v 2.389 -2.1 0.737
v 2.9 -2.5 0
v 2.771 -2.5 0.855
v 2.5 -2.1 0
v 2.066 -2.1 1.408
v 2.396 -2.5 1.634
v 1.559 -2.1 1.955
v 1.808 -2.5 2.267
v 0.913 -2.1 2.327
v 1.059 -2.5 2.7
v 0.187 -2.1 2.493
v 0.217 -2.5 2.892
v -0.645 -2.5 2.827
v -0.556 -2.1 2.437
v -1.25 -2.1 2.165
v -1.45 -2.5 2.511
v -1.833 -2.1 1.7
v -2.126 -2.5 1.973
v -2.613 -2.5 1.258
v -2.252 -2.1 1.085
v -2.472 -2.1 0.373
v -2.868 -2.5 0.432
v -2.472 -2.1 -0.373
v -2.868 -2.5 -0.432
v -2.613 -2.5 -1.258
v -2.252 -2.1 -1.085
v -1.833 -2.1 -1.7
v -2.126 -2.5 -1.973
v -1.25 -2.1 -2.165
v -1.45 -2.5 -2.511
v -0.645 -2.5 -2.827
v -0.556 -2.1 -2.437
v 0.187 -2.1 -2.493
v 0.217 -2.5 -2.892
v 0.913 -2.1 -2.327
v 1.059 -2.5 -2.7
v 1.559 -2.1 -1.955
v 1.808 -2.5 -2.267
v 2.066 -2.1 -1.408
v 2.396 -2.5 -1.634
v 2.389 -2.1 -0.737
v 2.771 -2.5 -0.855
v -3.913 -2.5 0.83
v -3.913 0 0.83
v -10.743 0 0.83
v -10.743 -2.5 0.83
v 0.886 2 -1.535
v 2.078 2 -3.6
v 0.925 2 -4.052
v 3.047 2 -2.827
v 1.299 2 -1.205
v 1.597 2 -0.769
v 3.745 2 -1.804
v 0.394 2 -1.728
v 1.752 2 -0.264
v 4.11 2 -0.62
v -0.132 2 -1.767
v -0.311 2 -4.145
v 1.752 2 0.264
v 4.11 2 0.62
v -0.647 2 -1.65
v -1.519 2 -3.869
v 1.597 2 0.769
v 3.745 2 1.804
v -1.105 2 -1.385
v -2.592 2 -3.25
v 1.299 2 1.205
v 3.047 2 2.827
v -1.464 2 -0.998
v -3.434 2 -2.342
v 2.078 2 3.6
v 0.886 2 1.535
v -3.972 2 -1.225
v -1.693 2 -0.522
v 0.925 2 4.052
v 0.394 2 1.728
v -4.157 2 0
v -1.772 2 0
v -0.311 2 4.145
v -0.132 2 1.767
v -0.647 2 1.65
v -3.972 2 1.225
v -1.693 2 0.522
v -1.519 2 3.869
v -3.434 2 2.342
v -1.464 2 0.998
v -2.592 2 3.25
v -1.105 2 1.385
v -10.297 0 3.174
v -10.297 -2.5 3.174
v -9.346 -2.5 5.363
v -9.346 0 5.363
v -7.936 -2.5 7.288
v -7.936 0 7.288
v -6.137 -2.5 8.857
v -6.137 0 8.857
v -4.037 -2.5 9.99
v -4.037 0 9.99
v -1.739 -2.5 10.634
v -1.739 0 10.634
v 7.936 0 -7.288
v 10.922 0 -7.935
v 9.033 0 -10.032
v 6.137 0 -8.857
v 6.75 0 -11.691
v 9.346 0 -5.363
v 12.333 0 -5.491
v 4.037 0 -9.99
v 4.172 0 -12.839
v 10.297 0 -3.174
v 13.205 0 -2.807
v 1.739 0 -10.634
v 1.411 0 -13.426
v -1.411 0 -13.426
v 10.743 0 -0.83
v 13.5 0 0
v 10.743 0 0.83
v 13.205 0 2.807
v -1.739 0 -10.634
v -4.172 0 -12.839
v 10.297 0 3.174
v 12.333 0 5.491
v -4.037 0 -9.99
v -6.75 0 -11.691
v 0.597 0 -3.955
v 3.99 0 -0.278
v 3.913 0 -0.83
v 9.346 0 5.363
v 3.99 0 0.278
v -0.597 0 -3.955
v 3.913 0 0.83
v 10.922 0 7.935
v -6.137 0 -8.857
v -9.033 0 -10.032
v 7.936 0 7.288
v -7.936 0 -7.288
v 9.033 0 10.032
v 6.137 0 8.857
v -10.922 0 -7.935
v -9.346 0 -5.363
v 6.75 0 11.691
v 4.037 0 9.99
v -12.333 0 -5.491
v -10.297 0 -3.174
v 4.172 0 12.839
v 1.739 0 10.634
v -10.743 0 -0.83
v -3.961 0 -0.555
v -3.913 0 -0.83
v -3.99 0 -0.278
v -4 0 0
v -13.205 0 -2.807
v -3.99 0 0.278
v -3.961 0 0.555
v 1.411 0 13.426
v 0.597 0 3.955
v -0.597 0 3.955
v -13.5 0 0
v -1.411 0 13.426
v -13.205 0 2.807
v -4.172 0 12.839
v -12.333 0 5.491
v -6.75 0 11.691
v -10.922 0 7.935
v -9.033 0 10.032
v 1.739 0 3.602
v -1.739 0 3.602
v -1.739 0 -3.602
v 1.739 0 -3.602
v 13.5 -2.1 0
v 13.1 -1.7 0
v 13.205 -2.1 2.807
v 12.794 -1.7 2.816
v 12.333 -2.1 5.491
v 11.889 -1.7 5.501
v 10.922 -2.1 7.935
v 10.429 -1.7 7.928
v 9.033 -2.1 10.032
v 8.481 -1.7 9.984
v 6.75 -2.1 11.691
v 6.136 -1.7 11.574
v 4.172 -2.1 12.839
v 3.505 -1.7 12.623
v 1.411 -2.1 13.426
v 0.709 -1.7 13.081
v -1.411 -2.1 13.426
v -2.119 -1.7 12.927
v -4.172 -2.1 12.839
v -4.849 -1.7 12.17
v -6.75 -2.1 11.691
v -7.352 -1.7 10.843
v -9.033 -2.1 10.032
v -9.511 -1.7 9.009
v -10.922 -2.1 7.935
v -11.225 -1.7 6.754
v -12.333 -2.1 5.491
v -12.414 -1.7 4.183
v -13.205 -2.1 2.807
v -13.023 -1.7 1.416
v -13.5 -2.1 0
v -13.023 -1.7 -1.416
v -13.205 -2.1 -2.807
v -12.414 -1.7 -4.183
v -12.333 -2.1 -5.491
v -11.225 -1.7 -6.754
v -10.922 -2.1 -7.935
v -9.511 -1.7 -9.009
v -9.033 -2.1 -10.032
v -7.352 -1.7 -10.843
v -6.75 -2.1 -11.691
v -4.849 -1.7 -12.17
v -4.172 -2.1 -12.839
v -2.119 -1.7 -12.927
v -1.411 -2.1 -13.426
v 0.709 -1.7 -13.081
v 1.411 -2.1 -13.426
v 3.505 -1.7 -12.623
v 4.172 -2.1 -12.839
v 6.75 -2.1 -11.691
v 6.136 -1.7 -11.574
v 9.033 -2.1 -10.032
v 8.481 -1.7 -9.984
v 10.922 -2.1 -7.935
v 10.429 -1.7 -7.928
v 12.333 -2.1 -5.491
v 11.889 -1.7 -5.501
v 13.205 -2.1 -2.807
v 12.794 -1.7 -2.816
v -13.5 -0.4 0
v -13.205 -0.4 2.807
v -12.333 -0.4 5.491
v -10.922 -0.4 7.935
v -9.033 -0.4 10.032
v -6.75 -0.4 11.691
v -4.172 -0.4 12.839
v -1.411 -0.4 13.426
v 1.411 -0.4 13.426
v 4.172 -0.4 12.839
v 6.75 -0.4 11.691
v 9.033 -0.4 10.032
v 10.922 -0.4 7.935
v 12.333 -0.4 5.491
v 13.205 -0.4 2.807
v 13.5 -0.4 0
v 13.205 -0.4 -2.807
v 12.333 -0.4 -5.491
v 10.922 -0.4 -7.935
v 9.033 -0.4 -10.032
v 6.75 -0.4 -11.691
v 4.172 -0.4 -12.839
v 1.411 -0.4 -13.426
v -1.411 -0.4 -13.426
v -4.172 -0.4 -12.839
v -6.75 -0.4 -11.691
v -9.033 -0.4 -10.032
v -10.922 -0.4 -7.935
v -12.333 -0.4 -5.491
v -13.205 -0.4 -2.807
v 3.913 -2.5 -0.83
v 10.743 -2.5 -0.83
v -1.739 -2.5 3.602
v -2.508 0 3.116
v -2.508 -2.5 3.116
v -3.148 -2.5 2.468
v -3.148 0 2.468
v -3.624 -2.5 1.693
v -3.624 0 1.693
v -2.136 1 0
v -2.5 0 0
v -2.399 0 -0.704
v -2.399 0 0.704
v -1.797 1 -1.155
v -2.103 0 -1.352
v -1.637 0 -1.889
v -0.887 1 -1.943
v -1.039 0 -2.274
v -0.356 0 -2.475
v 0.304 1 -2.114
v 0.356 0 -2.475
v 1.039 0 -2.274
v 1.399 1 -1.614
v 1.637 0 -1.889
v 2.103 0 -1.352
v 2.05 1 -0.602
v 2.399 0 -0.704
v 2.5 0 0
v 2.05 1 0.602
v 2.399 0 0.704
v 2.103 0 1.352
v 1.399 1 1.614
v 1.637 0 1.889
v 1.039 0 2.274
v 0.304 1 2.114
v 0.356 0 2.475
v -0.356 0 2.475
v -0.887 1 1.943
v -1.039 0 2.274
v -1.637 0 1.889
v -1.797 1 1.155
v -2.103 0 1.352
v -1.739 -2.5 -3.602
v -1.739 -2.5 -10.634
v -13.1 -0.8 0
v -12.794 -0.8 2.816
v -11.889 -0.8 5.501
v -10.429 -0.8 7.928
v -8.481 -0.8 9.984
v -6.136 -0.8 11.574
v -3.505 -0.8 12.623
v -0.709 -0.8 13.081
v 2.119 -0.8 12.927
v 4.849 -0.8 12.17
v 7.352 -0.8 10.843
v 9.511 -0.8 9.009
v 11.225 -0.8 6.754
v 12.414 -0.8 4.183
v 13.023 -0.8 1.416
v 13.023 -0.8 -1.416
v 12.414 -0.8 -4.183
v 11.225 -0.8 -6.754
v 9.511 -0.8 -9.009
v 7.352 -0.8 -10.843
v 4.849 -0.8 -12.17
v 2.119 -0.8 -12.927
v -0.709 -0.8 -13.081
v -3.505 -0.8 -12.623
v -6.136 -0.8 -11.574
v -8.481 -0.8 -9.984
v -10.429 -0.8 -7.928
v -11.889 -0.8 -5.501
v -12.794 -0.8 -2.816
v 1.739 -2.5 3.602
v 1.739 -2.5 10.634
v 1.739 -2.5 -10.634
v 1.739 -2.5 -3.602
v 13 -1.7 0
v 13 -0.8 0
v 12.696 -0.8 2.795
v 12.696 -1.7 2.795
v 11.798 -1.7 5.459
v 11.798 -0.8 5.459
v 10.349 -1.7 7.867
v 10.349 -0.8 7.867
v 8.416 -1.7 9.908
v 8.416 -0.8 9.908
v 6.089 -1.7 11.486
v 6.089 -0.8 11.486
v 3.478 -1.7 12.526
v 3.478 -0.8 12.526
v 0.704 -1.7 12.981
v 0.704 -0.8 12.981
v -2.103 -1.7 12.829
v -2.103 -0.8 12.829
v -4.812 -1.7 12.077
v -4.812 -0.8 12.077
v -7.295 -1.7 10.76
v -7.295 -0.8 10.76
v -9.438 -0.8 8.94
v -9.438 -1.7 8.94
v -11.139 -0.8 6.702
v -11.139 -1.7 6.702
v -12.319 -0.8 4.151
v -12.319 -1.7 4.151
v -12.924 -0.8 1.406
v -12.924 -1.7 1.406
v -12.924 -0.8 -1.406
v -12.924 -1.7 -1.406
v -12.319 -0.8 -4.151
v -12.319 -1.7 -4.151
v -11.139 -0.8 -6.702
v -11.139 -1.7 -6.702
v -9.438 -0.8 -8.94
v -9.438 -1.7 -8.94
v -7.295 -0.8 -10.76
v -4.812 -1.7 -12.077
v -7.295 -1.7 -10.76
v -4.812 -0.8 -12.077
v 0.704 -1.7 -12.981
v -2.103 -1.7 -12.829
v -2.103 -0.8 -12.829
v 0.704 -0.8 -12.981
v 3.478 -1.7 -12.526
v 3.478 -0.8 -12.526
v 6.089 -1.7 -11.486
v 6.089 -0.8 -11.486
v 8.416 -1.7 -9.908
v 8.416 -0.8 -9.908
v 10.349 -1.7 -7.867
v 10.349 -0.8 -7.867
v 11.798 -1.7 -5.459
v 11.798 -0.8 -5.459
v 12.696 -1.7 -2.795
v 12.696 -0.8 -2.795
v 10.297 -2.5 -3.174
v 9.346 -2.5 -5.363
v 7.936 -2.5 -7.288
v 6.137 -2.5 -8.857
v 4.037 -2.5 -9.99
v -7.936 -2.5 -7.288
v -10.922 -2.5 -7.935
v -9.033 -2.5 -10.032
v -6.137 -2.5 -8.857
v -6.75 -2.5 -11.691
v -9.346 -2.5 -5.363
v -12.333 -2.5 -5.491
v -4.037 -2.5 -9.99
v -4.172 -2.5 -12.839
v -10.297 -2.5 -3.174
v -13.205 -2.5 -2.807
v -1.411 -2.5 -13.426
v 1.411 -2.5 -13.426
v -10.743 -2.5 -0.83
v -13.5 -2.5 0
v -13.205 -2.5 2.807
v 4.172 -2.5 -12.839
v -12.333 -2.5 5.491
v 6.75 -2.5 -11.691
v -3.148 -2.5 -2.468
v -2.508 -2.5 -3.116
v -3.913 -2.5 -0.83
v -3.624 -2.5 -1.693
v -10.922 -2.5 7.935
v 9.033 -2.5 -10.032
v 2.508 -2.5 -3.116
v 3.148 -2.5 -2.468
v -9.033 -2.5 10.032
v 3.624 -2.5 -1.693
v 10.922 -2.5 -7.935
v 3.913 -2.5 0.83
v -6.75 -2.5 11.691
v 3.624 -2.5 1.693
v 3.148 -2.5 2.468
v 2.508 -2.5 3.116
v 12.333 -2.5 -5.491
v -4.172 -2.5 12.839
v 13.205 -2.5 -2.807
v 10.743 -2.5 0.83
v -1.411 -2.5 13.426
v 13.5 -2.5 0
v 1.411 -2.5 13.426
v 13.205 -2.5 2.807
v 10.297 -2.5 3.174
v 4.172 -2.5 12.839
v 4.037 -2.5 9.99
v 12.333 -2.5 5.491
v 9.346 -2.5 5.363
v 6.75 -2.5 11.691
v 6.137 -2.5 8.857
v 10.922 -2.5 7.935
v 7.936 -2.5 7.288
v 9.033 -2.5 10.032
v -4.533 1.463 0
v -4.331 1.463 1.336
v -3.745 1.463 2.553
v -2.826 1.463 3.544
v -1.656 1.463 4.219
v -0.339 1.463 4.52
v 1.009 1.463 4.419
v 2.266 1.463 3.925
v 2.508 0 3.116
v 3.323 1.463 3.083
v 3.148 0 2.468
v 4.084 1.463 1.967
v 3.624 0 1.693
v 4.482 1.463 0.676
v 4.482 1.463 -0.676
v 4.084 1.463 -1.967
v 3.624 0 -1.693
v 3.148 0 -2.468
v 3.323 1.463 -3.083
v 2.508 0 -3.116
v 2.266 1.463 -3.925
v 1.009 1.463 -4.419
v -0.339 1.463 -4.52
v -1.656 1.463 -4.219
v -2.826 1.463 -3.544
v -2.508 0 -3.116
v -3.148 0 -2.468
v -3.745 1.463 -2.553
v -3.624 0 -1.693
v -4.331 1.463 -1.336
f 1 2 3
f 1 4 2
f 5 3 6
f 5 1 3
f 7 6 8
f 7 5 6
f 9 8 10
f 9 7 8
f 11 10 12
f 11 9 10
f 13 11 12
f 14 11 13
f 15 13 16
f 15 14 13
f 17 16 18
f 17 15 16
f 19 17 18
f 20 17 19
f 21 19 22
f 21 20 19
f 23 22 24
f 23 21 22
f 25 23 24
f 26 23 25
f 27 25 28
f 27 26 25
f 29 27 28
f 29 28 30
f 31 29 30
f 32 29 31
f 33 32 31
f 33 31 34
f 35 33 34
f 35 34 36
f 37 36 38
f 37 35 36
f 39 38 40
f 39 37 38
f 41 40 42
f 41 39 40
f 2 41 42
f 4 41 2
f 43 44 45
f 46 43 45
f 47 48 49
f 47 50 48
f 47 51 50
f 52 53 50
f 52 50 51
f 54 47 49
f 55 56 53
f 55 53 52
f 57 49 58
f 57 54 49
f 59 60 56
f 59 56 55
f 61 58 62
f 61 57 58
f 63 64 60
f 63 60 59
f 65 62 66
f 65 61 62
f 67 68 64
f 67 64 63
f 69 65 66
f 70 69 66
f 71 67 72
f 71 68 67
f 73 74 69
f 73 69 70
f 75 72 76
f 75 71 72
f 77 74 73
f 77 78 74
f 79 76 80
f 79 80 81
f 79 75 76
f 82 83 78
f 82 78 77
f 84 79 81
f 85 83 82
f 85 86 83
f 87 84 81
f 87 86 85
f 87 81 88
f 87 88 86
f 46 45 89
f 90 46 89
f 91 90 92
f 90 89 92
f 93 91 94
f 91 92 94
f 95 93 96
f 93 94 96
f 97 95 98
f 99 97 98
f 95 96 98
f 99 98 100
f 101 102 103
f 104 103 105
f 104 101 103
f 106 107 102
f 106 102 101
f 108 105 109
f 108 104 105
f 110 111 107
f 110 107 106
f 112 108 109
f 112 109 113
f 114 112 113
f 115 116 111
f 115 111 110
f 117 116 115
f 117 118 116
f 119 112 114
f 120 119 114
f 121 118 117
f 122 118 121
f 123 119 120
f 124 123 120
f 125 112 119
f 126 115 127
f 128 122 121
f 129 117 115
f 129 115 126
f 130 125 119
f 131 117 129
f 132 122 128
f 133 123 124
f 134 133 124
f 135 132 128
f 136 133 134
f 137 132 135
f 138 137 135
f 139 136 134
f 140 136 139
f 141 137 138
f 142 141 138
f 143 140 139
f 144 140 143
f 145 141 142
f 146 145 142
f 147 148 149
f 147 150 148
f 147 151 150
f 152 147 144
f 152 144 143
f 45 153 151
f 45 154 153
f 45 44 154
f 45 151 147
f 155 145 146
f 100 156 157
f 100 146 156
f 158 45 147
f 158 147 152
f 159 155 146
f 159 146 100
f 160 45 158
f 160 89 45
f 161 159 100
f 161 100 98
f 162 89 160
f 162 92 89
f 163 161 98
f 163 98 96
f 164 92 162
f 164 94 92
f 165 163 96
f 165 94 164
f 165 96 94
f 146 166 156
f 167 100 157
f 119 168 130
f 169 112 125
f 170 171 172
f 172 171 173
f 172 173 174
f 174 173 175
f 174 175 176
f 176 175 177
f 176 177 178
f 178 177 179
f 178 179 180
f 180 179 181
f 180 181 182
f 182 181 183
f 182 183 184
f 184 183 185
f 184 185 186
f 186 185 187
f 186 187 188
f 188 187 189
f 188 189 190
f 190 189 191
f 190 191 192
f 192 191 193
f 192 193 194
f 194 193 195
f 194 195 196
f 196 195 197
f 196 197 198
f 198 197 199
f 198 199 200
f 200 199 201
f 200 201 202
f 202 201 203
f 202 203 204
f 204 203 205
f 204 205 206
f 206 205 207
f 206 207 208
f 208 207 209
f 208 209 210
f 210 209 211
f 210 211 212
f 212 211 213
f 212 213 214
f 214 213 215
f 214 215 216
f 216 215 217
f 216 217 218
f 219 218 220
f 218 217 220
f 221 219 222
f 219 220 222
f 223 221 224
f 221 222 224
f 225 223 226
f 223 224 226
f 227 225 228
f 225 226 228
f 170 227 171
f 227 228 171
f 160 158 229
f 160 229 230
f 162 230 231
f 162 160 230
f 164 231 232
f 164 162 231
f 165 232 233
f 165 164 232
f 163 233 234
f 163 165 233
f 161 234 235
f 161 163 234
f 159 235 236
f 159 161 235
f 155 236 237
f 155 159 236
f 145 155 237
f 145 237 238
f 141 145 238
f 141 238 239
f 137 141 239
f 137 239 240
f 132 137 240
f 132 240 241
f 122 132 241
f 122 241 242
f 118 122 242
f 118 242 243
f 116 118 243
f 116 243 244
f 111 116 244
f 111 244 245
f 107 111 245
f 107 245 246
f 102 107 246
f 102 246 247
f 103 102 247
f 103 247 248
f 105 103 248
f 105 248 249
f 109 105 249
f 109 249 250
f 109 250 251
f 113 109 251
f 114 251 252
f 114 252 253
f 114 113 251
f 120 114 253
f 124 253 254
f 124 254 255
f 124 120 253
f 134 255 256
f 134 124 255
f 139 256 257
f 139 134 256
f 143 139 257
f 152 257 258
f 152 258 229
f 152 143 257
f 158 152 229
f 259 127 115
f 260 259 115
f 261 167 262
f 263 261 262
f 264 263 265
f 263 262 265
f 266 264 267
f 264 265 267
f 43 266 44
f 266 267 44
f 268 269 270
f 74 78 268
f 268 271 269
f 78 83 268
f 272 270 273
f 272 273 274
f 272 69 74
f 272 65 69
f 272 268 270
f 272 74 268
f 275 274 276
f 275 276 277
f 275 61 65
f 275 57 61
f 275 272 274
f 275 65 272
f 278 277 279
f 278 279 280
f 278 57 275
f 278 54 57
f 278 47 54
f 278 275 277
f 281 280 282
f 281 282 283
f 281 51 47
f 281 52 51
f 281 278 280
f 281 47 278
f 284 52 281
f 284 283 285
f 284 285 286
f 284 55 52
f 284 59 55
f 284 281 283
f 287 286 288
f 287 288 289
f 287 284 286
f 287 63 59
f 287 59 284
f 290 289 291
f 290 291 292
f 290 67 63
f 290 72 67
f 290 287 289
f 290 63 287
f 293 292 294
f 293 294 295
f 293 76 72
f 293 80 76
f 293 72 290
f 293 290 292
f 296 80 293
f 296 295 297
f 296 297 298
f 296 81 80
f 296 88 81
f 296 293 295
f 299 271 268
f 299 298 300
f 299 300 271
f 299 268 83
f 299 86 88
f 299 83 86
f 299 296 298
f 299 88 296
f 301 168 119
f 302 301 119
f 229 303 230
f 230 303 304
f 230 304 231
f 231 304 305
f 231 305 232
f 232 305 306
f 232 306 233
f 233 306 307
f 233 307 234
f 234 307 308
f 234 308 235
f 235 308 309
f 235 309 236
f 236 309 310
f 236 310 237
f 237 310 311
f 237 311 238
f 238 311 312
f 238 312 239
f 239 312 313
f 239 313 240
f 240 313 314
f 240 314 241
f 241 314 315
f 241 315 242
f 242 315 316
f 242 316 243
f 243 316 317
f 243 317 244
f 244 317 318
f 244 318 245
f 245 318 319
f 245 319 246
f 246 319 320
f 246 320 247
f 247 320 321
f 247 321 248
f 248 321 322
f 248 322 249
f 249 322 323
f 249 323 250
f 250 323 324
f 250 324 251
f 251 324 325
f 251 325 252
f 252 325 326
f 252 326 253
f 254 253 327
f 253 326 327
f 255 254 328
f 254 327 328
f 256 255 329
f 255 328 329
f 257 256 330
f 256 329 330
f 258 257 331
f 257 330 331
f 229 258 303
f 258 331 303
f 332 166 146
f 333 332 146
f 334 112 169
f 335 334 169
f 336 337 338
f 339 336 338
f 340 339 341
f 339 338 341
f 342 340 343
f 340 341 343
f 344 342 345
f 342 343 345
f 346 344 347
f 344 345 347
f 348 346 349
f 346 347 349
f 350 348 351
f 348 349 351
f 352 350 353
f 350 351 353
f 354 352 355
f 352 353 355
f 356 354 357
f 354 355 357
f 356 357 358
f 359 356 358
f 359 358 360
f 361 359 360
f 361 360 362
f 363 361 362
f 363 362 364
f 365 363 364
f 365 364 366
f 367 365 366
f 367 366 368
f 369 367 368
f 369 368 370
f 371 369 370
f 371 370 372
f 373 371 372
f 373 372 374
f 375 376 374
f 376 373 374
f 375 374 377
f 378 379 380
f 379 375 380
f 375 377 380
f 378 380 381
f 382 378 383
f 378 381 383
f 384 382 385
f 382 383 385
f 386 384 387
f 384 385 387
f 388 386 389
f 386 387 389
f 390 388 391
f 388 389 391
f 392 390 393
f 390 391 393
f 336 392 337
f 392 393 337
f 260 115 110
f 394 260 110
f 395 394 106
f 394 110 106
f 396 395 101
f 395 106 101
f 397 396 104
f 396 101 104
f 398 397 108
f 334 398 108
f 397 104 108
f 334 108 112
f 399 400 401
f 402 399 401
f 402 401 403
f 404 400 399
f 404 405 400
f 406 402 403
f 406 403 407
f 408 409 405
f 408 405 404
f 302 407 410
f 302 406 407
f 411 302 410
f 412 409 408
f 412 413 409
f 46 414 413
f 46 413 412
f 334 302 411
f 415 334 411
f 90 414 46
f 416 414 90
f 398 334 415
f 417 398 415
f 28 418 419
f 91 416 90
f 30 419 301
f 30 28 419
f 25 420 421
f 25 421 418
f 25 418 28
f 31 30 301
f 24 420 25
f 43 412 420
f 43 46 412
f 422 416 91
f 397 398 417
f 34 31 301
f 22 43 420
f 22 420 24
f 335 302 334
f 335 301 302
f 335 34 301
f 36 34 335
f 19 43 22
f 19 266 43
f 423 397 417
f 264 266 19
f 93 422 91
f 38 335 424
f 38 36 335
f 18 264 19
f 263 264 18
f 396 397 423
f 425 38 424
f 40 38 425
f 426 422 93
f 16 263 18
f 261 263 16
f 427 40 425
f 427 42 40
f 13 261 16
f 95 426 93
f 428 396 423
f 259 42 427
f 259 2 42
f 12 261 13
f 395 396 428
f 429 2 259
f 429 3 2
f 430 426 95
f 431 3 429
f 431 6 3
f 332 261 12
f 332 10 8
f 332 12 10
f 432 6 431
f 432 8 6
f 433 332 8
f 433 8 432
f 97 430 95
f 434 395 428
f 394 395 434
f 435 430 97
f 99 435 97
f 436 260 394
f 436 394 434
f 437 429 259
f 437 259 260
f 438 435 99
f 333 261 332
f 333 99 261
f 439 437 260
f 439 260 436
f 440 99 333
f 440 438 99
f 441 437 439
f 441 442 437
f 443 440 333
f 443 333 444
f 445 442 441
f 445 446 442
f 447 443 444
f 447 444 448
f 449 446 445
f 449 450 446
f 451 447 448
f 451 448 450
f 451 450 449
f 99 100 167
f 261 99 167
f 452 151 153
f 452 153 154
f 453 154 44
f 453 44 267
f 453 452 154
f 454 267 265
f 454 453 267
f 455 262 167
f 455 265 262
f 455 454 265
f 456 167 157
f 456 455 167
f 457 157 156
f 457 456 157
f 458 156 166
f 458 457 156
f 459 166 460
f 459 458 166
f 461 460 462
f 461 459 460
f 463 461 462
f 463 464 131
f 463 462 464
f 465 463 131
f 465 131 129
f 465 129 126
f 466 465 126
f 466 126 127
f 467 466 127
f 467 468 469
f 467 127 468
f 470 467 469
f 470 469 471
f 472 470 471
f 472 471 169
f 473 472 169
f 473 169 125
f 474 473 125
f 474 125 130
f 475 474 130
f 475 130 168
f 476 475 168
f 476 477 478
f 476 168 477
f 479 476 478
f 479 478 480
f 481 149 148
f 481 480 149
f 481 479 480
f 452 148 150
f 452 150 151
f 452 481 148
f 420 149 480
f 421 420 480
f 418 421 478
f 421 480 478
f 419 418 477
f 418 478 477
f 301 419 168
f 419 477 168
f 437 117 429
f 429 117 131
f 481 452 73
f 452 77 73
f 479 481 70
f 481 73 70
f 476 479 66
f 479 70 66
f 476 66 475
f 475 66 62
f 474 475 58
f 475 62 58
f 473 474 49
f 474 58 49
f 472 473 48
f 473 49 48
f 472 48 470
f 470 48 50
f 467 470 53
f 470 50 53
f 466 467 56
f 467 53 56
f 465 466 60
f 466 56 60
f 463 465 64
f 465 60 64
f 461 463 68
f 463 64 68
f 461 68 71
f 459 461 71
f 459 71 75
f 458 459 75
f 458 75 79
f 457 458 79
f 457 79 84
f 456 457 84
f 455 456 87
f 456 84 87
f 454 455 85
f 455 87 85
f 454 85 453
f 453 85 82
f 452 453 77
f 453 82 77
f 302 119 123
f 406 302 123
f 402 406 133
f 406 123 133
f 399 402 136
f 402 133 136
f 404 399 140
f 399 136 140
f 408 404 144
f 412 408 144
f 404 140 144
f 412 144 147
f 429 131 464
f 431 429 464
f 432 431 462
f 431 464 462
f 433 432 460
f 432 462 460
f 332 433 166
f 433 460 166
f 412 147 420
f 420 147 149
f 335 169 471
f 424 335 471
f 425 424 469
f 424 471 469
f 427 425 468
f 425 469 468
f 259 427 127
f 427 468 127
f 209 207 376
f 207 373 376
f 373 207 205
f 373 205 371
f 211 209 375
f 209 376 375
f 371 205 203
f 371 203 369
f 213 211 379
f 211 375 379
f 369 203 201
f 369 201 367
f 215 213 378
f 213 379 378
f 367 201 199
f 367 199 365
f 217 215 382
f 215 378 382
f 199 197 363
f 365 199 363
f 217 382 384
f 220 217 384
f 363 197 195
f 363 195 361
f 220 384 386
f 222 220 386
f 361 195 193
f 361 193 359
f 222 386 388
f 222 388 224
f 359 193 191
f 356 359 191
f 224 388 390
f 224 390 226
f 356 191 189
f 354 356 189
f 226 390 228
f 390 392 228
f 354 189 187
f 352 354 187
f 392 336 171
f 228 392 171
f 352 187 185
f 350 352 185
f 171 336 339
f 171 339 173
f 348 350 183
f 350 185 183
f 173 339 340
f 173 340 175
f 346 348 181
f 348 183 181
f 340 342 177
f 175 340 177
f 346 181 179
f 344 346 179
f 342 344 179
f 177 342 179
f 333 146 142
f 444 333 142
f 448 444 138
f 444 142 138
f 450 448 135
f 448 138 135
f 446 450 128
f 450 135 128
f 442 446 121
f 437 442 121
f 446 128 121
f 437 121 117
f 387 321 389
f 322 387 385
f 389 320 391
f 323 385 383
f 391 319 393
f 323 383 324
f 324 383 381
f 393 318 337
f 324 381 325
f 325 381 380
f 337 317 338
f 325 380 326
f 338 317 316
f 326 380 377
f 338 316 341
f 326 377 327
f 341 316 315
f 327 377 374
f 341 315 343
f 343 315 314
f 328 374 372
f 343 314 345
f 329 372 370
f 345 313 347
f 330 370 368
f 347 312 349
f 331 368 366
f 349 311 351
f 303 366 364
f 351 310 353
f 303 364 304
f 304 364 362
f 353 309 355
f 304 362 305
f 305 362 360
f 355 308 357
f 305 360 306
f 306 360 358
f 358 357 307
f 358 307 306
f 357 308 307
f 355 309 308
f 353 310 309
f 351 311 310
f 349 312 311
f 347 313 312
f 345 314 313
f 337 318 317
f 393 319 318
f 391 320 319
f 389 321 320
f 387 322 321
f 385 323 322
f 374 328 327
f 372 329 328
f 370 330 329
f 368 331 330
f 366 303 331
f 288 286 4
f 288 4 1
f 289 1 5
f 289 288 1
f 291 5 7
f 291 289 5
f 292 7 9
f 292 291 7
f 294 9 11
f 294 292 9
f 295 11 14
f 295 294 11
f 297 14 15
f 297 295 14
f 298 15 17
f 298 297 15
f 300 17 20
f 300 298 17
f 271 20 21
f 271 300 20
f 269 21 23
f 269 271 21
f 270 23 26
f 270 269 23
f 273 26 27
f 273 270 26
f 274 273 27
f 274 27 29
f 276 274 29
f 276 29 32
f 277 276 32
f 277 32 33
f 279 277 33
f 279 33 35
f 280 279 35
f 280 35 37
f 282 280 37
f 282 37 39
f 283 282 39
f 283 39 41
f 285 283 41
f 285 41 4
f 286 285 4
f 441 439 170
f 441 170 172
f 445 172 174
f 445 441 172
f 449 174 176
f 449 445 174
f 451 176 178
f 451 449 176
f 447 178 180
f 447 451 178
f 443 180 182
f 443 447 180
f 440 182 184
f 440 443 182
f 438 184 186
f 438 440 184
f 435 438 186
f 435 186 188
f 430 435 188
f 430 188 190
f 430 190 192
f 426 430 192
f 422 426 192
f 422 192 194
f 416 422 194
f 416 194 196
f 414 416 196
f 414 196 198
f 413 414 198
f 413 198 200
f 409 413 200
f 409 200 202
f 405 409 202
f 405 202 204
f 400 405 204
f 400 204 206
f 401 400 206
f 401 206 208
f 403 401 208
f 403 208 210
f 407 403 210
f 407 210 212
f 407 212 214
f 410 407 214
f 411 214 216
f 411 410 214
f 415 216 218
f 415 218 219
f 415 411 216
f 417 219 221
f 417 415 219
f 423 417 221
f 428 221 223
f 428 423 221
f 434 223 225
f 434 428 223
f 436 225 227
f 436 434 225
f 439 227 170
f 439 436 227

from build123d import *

# Parameters (mm, degrees)
F0_R     = 13
F0_R_2   = 2.5
F1_DEPTH = 2.5
F2_R     = 13.5
F2_R_2   = 10.9075922355
F3_DEPTH = 0.8
F4_R     = 13.5
F4_R_2   = 11.2490689916
F5_DEPTH = 0.8
F6_R     = 4
F6_R_2   = 2.5
F7_DEPTH = 2
F7_TAPER = -20


# Not quite as in the source:
# - a fillet or chamfer that OpenCascade refuses, or shapes differently, is made with other operations: its cross-section is extruded or revolved along the edge and cut away or added


with BuildPart() as f1:
    # F0 (on Front) → F1 (new body)
    with BuildSketch(Plane.XZ):
        Circle(F0_R)
        with BuildLine():
            ThreePointArc((-1.7385059182, -10.6337636412), (-7.9358324082, -7.2884769323), (-10.7429600727, -0.8295425725))
            Line((-10.7429600727, -0.8295425725), (-3.9130370712, -0.8295425725))
            ThreePointArc((-3.9130370712, -0.8295425725), (-3.1475751054, -2.468353896), (-1.7385059182, -3.6024432227))
            Line((-1.7385059182, -3.6024432227), (-1.7385059182, -10.6337636412))
        make_face(mode=Mode.SUBTRACT)
        with BuildLine():
            Line((3.9130370712, -0.8295425725), (10.7429600727, -0.8295425725))
            ThreePointArc((10.7429600727, -0.8295425725), (7.9358324082, -7.2884769323), (1.7385059182, -10.6337636412))
            Line((1.7385059182, -10.6337636412), (1.7385059182, -3.6024432227))
            ThreePointArc((1.7385059182, -3.6024432227), (3.1475751054, -2.468353896), (3.9130370712, -0.8295425725))
        make_face(mode=Mode.SUBTRACT)
        with BuildLine():
            ThreePointArc((-1.7385059182, 3.6024432227), (-3.1475751054, 2.468353896), (-3.9130370712, 0.8295425725))
            Line((-3.9130370712, 0.8295425725), (-10.7429600727, 0.8295425725))
            ThreePointArc((-10.7429600727, 0.8295425725), (-7.9358324082, 7.2884769323), (-1.7385059182, 10.6337636412))
            Line((-1.7385059182, 10.6337636412), (-1.7385059182, 3.6024432227))
        make_face(mode=Mode.SUBTRACT)
        Circle(F0_R_2, mode=Mode.SUBTRACT)
        with BuildLine():
            ThreePointArc((1.7385059182, 10.6337636412), (7.9358324082, 7.2884769323), (10.7429600727, 0.8295425725))
            Line((10.7429600727, 0.8295425725), (3.9130370712, 0.8295425725))
            ThreePointArc((3.9130370712, 0.8295425725), (3.1475751054, 2.468353896), (1.7385059182, 3.6024432227))
            Line((1.7385059182, 3.6024432227), (1.7385059182, 10.6337636412))
        make_face(mode=Mode.SUBTRACT)
    extrude(amount=F1_DEPTH)

    # F2 (on face) → F3 (join)
    with BuildSketch(Plane(origin=(0, 0, 0), x_dir=(-1, 0, 0), z_dir=(0, 1, 0))):
        Circle(F2_R)
        Circle(F2_R_2, mode=Mode.SUBTRACT)
    extrude(amount=-F3_DEPTH)

    # F4 (on face) → F5 (join)
    with BuildSketch(Plane.XZ.offset(2.5)):
        Circle(F4_R)
        Circle(F4_R_2, mode=Mode.SUBTRACT)
    extrude(amount=-F5_DEPTH)

    # F6 (on face) → F7 (join)
    with BuildSketch(Plane(origin=(0, 0, 0), x_dir=(-1, 0, 0), z_dir=(0, 1, 0))):
        Circle(F6_R)
        Circle(F6_R_2, mode=Mode.SUBTRACT)
    extrude(amount=F7_DEPTH, taper=F7_TAPER)

    # F8: chamfer of 0.4 on 4 edges, made by hand

    # F8_s1 → F8_t2 (revolve, cut)
    with BuildSketch(Plane.XY):
        Polygon((13.5, -2.1), (13.1, -1.7), (13.5, -1.7), align=None)
    revolve(axis=Axis((0, -1.7, 0), (0, -1, 0)), mode=Mode.SUBTRACT)

    # F8_s3 → F8_t4 (revolve, cut)
    with BuildSketch(Plane.XY):
        Polygon((-13.5, -0.4), (-13.1, -0.8), (-13.5, -0.8), align=None)
    revolve(axis=Axis((0, -0.8, 0), (0, 1, 0)), mode=Mode.SUBTRACT)

    # F8_s5 → F8_t6 (revolve, cut)
    with BuildSketch(Plane.XY):
        Polygon((2.9, -2.5), (2.5, -2.1), (2.5, -2.5), align=None)
    revolve(axis=Axis((0, -2.5, 0), (0, -1, 0)), mode=Mode.SUBTRACT)

    # F8_s7 → F8_t8 (revolve, cut)
    with BuildSketch(Plane.XY):
        Polygon((-4.5325583141, 1.4631919427), (-4.1566812658, 2), (-4.7279404685, 2), align=None)
    revolve(axis=Axis((0, 2, 0), (0, -1, 0)), mode=Mode.SUBTRACT)


solid = f1.part
